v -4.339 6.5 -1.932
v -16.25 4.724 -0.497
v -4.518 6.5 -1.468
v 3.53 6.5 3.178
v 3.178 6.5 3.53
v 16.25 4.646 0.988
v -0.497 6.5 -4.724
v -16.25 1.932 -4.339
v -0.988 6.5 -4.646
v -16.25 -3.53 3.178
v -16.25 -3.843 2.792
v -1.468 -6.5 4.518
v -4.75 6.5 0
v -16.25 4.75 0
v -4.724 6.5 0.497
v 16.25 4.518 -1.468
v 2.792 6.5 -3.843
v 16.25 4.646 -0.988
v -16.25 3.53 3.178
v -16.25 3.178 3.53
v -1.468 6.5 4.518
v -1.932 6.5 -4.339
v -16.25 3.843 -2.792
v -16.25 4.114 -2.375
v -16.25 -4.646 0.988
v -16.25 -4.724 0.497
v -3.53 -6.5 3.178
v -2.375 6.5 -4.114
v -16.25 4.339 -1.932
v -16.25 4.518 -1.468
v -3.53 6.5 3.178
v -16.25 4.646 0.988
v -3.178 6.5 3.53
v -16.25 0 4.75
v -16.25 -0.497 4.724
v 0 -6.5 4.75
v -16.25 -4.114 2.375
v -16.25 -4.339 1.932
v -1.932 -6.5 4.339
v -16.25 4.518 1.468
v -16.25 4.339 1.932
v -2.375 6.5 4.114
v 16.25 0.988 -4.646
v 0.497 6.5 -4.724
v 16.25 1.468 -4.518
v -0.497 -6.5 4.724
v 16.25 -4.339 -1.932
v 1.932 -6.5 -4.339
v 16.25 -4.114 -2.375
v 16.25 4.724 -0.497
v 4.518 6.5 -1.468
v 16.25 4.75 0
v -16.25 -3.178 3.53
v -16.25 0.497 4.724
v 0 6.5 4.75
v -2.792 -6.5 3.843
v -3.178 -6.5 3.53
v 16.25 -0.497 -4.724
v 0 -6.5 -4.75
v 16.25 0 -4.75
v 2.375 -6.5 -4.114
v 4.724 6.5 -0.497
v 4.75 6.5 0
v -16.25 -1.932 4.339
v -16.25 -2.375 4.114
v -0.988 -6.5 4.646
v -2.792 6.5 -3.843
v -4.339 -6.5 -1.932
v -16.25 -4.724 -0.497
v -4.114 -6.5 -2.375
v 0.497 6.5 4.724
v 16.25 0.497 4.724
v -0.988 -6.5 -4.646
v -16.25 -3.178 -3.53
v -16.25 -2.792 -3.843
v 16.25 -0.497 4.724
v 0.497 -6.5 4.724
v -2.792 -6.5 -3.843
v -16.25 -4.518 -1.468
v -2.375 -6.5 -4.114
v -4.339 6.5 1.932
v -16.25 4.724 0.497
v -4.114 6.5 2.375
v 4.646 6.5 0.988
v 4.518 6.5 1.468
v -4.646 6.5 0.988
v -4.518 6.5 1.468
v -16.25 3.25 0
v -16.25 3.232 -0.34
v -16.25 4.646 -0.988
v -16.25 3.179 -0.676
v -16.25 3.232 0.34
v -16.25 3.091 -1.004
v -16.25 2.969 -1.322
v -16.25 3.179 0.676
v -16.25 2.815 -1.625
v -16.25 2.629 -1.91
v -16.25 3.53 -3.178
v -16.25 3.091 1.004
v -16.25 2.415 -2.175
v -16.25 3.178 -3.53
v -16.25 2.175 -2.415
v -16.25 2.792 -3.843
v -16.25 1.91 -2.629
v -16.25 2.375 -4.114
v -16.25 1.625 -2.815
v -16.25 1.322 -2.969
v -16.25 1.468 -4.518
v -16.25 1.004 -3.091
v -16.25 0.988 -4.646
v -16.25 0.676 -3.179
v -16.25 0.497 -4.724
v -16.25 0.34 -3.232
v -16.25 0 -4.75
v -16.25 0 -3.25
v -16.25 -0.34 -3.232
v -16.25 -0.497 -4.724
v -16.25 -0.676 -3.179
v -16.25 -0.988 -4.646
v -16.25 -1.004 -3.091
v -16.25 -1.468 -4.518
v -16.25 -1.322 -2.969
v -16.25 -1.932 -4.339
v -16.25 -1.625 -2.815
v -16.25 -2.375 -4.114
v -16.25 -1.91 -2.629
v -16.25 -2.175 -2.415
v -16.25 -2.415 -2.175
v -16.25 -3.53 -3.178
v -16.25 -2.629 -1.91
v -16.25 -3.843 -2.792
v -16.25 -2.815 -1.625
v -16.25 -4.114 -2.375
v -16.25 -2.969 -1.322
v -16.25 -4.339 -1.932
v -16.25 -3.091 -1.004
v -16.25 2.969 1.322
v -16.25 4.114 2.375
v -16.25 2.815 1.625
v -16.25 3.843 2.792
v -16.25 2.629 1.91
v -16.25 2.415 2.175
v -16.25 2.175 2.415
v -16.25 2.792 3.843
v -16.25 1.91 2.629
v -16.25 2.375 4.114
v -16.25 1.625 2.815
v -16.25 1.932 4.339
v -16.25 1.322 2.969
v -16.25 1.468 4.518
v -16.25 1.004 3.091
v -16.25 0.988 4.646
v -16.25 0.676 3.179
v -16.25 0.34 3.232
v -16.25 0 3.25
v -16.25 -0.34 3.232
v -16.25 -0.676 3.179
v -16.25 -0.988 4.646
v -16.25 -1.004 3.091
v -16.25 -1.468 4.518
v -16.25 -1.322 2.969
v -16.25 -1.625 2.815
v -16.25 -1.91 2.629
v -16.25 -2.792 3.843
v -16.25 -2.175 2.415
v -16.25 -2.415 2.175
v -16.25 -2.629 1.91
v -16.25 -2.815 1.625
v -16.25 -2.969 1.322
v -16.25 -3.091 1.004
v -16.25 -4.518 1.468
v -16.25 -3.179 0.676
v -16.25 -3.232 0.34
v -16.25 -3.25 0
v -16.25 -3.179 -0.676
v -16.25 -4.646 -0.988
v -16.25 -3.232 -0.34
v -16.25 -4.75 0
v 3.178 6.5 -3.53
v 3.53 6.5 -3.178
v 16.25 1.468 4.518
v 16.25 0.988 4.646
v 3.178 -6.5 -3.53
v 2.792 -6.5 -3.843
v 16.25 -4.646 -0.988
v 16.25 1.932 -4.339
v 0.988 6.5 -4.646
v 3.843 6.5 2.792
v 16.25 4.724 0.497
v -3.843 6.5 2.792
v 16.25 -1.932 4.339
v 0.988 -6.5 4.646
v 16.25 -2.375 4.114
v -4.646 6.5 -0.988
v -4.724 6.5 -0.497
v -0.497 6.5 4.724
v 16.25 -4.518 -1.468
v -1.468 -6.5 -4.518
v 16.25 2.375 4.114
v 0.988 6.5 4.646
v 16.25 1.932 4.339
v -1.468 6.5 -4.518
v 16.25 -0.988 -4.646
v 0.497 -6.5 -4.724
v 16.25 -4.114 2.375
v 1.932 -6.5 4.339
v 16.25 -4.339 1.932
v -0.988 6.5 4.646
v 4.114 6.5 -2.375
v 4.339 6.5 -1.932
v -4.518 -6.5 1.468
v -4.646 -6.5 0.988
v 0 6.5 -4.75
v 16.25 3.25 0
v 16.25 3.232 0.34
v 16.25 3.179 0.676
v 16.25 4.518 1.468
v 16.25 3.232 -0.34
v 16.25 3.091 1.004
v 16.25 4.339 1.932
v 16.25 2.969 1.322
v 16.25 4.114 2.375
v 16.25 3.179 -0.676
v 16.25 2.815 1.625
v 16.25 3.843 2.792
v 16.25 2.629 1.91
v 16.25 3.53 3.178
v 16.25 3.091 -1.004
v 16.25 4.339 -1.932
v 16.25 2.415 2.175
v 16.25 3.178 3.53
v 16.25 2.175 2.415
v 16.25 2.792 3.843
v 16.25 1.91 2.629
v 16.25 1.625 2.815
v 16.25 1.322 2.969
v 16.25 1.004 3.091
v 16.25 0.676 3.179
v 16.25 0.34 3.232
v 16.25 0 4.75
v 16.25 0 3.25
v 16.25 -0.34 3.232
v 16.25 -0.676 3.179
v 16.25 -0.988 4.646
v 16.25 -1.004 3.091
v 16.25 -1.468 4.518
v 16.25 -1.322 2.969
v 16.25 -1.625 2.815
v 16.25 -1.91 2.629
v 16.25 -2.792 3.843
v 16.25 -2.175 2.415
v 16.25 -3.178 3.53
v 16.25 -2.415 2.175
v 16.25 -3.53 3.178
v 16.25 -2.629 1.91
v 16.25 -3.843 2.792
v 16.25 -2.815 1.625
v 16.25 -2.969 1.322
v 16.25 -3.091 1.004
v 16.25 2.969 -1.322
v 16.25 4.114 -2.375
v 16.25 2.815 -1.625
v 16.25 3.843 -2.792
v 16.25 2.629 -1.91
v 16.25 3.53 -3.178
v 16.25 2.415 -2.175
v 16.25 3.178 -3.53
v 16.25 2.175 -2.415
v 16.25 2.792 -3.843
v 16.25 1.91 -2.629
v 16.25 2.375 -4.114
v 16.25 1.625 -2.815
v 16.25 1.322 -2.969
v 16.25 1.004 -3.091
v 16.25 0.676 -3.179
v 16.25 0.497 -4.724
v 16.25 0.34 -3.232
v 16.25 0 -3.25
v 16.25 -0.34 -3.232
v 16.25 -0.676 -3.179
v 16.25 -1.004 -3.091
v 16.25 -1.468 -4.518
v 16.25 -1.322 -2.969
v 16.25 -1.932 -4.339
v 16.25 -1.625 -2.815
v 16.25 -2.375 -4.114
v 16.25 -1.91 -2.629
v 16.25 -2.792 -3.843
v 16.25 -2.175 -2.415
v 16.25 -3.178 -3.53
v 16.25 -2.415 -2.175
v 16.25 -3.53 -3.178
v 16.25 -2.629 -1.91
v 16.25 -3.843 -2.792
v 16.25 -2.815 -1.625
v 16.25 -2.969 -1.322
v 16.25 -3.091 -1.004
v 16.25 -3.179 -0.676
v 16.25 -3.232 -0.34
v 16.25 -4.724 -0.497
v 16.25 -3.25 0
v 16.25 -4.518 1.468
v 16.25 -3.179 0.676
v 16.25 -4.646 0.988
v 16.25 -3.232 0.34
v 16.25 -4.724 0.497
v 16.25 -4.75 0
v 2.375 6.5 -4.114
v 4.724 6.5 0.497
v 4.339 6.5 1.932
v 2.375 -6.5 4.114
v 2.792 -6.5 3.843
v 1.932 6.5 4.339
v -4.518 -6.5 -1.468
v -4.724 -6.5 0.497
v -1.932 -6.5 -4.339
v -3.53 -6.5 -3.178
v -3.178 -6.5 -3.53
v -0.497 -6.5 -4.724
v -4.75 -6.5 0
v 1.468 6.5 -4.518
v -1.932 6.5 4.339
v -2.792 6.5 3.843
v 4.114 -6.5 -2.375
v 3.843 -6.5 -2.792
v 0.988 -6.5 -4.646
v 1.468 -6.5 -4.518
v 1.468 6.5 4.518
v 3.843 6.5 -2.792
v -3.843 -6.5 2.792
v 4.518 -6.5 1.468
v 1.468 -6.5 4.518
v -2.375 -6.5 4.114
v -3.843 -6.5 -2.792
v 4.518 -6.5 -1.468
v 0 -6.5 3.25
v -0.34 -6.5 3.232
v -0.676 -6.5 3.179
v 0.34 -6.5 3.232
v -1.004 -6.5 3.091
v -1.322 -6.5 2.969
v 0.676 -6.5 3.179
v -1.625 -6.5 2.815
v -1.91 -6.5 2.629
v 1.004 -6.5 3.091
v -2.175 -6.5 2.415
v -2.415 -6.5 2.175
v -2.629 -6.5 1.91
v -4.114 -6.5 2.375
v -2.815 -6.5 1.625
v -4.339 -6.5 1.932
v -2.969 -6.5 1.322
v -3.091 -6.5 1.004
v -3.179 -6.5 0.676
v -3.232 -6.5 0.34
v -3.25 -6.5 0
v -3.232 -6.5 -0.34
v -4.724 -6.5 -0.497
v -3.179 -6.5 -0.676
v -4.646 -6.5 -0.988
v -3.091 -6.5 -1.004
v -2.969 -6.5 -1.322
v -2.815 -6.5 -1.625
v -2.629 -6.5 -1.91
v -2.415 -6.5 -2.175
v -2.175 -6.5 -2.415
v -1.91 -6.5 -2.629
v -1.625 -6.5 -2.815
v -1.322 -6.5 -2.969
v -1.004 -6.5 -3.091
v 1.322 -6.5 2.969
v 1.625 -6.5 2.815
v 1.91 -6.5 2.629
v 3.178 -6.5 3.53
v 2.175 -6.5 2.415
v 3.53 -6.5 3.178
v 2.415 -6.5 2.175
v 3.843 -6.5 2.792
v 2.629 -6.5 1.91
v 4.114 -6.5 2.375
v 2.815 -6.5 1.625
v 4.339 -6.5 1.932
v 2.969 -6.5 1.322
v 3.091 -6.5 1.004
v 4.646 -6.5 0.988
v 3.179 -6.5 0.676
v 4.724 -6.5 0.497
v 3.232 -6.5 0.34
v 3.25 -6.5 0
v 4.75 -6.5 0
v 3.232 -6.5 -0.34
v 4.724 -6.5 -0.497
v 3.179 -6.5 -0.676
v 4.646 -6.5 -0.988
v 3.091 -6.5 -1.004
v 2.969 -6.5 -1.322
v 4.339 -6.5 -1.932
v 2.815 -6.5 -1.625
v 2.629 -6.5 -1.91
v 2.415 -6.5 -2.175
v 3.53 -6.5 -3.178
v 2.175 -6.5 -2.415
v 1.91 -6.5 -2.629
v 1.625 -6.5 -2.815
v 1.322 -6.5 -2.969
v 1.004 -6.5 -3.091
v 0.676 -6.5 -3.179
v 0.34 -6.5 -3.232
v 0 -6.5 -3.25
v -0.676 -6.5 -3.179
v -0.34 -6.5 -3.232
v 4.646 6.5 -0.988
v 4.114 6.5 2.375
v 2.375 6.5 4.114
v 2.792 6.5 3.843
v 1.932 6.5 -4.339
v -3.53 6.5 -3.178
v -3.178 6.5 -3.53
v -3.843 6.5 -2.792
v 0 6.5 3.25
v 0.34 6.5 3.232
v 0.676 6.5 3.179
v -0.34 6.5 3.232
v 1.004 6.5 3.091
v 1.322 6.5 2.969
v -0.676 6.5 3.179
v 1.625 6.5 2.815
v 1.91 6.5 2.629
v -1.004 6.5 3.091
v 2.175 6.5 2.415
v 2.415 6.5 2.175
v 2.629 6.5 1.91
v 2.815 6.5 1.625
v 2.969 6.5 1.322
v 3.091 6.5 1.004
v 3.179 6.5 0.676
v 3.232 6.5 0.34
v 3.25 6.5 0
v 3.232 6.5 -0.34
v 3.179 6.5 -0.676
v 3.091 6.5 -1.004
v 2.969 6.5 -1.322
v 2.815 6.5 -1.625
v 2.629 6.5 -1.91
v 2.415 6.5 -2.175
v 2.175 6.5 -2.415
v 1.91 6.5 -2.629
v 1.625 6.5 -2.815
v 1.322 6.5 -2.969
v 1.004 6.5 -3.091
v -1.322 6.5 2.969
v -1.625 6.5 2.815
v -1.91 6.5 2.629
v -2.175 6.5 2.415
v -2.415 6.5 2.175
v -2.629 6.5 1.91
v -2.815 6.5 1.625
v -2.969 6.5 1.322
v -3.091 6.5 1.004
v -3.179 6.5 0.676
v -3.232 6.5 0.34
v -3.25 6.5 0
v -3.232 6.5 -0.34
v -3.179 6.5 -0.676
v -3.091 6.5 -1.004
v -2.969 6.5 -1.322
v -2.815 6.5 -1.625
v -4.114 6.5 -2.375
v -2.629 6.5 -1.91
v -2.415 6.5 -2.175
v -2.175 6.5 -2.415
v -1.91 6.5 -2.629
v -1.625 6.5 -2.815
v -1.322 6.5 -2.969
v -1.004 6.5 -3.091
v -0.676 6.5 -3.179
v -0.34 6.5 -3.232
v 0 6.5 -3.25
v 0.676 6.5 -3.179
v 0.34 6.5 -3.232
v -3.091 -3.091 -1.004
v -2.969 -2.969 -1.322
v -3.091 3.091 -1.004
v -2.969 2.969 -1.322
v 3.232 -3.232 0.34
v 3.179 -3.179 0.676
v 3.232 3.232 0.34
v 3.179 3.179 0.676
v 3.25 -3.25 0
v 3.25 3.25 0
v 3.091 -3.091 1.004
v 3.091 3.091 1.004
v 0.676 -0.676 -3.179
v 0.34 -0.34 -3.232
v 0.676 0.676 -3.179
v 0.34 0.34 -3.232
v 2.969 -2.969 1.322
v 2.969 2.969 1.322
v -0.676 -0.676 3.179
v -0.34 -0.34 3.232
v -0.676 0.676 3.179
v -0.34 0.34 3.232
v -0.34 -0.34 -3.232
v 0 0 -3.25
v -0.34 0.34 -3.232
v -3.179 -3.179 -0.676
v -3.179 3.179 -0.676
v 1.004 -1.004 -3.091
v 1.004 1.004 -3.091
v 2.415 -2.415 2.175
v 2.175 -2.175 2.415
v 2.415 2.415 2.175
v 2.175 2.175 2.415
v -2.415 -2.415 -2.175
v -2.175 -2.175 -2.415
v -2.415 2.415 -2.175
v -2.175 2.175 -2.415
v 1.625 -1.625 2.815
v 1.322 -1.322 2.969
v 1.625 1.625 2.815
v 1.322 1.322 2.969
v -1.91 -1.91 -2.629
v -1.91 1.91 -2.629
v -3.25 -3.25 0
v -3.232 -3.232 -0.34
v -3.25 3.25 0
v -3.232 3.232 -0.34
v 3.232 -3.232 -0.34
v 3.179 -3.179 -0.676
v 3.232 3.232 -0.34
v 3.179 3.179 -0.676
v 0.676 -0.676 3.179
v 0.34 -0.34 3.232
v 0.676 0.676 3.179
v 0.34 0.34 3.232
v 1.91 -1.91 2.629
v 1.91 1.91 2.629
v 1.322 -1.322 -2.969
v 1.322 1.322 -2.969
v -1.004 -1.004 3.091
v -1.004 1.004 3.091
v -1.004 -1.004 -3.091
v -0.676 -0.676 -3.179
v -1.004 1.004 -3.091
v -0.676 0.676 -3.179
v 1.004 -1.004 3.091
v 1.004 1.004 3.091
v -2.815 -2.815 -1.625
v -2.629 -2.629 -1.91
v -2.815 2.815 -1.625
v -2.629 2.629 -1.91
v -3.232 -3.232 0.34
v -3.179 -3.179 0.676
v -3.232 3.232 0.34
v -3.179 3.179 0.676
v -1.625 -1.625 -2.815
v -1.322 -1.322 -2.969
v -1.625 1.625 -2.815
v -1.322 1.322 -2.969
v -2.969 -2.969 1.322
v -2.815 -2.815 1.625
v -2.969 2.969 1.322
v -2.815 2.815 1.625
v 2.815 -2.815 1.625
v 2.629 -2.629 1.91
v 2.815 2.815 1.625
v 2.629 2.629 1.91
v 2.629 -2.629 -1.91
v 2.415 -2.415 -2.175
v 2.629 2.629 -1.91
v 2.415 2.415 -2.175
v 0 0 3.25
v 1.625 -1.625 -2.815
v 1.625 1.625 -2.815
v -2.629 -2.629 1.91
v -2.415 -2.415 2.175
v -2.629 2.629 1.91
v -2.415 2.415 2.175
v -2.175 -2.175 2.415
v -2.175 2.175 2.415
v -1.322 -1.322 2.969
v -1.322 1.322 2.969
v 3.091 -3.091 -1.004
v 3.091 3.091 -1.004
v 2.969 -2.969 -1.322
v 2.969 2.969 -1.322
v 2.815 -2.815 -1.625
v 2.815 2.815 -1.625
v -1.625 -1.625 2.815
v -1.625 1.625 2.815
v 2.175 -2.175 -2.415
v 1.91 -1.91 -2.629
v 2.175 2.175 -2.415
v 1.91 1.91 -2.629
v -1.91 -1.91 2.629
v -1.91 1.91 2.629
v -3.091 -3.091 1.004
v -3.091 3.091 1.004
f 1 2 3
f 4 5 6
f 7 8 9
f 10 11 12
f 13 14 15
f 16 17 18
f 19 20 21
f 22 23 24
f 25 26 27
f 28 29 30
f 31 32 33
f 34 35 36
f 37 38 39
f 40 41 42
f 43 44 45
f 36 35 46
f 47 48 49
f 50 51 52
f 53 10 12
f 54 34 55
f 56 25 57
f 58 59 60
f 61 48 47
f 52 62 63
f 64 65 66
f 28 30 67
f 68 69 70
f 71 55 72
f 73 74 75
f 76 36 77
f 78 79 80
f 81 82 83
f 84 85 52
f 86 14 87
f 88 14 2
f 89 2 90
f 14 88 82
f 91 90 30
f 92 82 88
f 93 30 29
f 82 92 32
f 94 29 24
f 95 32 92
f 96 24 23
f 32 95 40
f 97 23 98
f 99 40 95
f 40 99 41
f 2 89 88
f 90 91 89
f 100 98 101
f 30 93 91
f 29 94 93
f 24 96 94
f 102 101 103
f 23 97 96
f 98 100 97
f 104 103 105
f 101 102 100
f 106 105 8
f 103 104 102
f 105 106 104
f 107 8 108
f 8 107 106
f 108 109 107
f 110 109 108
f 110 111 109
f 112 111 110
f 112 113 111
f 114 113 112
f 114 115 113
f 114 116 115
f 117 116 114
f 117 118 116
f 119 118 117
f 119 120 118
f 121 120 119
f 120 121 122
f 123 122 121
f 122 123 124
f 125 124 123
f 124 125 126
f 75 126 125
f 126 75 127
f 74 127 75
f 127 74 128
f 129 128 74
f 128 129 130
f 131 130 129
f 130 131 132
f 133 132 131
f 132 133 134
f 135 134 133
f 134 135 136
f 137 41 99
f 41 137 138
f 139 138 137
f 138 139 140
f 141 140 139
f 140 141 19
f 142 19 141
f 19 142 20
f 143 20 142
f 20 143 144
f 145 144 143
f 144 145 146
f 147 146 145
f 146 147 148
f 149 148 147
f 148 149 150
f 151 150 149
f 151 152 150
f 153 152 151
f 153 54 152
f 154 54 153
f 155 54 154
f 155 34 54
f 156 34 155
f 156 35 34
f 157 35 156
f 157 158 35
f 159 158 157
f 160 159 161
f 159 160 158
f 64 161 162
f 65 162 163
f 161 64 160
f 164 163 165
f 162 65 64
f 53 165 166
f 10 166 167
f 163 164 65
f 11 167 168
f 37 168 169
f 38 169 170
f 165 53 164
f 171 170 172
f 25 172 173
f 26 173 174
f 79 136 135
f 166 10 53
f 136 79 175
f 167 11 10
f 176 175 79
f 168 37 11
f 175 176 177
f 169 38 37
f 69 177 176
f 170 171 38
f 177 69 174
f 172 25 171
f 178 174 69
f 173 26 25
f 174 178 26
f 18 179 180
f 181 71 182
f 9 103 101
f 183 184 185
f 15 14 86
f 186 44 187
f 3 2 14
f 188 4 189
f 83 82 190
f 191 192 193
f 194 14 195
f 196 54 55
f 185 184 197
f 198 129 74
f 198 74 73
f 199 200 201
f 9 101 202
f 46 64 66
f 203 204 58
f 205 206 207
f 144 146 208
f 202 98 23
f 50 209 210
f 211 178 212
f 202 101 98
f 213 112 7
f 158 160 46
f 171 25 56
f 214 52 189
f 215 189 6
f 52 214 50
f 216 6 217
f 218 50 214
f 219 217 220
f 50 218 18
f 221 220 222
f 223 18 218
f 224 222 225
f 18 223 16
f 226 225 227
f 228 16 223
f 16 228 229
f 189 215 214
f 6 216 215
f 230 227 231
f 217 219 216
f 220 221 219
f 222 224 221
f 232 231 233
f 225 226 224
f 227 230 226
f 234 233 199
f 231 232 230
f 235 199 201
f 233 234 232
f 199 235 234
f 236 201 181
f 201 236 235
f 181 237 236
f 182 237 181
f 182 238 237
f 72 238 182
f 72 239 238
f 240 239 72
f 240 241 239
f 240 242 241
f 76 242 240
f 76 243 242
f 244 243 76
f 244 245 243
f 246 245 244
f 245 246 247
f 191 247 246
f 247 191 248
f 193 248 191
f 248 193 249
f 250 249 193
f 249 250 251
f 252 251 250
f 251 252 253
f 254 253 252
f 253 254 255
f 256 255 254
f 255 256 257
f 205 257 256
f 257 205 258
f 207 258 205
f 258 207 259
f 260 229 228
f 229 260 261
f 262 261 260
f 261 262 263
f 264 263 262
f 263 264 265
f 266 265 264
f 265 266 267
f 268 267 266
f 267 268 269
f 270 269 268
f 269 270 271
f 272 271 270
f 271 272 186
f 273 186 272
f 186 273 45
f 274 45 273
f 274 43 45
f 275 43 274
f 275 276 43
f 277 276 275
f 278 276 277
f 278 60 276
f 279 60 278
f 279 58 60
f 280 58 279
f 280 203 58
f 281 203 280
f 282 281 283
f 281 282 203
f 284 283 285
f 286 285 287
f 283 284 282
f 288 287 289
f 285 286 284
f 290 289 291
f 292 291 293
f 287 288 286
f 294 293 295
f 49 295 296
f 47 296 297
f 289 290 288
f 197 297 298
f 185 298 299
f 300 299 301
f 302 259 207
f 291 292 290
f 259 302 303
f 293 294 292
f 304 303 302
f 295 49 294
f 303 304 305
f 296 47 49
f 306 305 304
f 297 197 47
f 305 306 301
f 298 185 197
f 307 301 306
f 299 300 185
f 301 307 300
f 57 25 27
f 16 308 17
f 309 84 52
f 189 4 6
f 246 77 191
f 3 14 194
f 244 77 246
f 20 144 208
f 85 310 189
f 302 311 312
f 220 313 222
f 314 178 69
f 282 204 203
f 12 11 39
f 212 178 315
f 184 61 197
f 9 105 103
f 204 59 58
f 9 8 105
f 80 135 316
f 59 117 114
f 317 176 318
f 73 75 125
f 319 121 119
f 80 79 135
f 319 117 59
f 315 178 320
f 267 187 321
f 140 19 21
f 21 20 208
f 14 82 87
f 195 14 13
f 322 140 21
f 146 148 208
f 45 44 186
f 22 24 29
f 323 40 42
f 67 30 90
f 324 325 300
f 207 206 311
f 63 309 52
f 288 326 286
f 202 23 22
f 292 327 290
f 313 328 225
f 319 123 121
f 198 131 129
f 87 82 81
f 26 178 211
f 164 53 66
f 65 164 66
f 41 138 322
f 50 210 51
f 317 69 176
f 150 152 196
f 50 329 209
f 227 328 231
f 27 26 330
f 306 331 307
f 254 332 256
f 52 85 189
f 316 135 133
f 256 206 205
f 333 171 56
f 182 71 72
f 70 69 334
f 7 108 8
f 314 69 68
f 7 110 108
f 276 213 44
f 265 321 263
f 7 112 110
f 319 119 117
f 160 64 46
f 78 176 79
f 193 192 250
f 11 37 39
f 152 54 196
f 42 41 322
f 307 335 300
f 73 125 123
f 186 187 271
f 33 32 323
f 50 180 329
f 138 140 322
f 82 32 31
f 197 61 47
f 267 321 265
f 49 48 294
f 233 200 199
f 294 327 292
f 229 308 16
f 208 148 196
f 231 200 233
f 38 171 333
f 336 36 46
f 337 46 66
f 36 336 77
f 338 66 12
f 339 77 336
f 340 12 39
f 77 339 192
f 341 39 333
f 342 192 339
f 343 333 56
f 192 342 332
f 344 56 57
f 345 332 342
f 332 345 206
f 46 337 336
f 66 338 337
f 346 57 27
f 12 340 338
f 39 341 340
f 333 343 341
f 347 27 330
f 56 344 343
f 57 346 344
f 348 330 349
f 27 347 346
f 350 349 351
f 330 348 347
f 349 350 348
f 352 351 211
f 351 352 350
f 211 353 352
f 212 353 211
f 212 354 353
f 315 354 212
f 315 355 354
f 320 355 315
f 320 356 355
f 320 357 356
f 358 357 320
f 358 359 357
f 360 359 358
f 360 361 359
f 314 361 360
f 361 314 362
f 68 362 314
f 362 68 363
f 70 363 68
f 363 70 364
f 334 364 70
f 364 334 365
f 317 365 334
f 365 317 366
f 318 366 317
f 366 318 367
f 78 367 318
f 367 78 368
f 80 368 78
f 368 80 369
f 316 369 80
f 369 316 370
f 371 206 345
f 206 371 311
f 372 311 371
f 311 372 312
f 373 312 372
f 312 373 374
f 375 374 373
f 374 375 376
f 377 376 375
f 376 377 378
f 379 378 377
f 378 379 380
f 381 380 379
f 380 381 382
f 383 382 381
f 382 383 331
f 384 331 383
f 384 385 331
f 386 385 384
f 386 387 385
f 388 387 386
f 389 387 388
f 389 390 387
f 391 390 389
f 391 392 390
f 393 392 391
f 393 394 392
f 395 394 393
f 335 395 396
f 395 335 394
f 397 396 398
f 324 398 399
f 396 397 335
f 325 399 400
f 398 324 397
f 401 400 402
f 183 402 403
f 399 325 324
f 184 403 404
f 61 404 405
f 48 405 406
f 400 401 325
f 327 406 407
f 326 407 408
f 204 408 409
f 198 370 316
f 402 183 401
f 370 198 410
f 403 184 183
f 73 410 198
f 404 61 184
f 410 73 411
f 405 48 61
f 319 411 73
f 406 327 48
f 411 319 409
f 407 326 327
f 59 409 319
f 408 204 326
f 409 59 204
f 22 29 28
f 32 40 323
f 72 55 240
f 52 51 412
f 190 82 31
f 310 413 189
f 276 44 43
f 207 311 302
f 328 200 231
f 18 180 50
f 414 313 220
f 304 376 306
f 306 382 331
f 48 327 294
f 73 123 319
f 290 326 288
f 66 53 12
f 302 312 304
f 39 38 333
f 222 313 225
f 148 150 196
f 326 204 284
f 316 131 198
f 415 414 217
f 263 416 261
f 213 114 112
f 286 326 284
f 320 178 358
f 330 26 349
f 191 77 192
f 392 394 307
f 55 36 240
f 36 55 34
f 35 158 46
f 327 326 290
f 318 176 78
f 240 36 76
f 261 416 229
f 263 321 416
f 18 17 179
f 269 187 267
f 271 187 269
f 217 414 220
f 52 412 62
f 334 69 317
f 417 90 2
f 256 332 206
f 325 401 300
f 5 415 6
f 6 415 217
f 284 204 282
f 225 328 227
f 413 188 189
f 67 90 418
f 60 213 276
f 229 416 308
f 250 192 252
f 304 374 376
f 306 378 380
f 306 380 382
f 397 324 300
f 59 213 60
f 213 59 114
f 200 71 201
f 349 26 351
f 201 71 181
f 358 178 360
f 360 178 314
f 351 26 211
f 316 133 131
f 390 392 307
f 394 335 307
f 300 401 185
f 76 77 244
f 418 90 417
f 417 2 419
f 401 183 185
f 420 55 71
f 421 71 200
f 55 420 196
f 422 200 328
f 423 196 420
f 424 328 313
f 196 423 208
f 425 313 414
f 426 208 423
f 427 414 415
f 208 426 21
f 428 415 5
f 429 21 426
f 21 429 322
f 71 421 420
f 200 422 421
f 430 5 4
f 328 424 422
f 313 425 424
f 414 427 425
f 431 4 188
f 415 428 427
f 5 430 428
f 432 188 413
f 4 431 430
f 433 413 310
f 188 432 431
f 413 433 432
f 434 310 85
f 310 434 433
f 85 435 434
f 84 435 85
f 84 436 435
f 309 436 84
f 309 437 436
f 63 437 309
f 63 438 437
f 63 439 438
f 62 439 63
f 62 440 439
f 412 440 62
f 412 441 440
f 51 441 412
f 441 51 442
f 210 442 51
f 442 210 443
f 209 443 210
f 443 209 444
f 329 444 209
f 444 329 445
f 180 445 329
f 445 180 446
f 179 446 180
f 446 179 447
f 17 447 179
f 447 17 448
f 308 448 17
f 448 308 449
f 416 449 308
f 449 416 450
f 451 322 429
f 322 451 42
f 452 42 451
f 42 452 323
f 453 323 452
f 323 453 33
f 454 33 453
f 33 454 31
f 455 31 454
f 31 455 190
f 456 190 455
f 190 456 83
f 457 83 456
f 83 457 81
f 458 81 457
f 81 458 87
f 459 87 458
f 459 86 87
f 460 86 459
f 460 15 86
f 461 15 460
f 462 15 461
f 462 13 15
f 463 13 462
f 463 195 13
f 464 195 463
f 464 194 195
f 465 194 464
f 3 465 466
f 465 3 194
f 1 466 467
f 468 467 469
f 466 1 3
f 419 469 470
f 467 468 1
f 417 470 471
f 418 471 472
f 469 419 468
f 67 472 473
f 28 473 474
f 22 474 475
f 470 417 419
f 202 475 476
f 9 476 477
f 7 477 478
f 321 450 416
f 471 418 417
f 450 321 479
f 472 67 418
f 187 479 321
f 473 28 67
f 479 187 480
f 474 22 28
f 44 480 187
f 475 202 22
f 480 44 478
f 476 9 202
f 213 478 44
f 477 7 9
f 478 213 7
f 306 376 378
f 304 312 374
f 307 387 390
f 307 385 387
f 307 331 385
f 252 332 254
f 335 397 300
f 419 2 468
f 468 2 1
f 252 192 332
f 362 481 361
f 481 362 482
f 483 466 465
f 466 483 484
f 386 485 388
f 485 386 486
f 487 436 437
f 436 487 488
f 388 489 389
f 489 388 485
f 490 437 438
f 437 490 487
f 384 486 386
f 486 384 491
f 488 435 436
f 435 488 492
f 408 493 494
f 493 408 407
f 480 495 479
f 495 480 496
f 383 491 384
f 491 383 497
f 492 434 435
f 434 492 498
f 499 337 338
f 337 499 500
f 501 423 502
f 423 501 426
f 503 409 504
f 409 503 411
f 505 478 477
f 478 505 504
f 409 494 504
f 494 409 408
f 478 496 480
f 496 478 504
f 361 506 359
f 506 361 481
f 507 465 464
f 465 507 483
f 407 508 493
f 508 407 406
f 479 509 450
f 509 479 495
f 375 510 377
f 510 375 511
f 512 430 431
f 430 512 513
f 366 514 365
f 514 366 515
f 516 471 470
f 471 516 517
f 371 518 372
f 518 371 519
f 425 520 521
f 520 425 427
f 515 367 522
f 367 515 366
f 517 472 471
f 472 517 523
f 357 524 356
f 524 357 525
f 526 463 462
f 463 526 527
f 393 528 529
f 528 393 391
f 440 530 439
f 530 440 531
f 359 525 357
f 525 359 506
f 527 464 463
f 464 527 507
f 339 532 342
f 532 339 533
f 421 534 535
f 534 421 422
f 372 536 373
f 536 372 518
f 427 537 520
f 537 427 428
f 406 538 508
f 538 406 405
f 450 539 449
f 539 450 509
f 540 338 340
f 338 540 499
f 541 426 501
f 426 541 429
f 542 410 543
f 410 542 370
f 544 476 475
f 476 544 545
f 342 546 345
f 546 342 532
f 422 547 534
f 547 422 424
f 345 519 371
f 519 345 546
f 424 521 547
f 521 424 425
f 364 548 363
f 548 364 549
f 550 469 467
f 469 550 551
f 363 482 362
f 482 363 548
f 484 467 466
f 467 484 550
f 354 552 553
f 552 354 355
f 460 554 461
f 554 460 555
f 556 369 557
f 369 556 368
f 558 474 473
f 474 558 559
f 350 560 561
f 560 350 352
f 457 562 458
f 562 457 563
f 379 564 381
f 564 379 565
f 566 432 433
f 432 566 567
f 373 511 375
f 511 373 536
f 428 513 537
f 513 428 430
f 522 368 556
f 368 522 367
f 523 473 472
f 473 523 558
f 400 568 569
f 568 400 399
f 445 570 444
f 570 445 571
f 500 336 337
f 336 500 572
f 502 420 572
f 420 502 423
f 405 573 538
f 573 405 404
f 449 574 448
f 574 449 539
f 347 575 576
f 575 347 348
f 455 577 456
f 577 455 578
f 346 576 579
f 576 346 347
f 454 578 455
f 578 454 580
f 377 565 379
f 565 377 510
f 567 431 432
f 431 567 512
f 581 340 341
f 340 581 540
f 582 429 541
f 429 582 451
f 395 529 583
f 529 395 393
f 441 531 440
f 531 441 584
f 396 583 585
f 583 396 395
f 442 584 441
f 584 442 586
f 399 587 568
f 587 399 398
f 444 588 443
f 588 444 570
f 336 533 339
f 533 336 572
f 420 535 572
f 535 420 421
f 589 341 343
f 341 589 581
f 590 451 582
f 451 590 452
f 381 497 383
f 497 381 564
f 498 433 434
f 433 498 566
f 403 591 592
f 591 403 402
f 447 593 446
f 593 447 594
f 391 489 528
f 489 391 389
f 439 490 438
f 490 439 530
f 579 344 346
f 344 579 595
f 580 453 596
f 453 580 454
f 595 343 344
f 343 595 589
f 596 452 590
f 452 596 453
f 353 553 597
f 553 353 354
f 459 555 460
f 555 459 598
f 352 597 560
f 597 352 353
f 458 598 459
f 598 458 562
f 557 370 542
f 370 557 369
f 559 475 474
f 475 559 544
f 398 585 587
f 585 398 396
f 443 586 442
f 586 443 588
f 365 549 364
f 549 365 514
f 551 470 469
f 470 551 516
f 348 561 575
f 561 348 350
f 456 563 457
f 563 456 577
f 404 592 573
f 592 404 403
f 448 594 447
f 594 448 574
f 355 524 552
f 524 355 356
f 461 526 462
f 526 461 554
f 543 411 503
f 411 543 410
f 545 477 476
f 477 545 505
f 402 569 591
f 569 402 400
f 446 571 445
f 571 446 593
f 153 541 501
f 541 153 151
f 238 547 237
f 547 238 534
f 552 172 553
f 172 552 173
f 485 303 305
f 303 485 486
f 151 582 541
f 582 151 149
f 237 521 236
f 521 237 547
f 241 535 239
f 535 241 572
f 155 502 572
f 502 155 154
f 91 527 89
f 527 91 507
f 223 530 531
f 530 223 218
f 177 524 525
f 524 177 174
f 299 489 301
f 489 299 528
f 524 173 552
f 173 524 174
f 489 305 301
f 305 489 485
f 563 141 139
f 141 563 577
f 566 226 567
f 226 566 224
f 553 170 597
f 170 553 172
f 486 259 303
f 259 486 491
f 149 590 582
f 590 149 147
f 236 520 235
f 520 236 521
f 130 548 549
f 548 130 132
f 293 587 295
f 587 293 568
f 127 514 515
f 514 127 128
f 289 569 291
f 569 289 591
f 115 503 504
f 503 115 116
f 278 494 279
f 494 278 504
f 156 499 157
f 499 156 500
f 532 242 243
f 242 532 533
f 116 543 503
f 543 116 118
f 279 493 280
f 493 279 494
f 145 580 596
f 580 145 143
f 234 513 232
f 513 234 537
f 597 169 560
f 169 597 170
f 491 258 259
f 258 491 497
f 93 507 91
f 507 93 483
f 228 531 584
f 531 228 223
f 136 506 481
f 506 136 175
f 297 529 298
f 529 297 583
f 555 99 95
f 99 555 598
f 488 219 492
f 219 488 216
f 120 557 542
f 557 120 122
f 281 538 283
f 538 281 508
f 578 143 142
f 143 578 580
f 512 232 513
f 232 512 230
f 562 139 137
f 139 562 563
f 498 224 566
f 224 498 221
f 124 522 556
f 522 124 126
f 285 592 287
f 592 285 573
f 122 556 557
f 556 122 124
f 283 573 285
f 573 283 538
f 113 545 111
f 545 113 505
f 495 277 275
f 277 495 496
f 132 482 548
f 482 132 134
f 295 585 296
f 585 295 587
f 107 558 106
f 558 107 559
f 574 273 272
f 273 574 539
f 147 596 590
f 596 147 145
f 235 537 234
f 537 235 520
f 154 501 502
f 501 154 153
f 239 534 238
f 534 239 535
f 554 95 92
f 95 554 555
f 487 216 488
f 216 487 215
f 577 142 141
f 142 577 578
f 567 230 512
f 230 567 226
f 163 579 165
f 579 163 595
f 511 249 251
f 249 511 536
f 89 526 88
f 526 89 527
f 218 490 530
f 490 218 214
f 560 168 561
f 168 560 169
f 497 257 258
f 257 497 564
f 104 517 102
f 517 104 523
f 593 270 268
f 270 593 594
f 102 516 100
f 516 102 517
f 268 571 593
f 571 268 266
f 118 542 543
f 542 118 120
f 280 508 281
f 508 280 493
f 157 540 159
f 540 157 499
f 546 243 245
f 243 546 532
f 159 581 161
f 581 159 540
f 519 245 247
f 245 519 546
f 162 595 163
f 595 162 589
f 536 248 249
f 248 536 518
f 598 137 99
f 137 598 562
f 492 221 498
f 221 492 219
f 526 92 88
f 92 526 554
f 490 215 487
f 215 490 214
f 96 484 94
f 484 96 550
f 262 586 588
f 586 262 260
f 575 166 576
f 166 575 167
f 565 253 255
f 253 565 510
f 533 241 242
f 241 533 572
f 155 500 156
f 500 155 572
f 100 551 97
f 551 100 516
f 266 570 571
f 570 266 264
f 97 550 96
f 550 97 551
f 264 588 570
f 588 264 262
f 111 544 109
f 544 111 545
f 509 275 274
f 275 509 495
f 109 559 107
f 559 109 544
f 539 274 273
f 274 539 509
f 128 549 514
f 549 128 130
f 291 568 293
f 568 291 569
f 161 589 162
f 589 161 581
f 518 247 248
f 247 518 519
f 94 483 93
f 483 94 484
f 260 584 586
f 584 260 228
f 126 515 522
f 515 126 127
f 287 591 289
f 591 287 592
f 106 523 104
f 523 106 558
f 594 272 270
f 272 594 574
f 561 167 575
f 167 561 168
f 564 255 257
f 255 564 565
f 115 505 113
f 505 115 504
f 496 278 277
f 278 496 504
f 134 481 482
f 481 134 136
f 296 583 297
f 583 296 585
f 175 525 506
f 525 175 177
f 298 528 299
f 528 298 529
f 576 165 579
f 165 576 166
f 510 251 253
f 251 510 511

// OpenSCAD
// Center cross for a drone frame

//=======================================================================
// Config
//=======================================================================
//beam diameter
dia1=6.5;

//wall thickness main cross beam
wall=1.5;

//socket depth for both axis
socket1=dia1;
socket2=2*socket1+dia1/2;

//z-offset between the two axis
//z_offset=6.5;
z_offset=0;

//stiffening plate
plate_thickness=2;

//use hull?
use_hull=1;
//=======================================================================

$fn=60;  //number of facets
out1 = dia1+2*wall; //outside diameter

difference() {
  if(use_hull)
    hull() SolidCross();
  else
    union() SolidCross();

  translate([0,socket1*2,-z_offset/2]) rotate([90,0,0]) cylinder(h=socket1*4,d=dia1);
  translate([socket2*2,0,z_offset/2]) rotate([0,-90,0]) cylinder(h=socket2*4,d=dia1);
}

module SolidCross() {
  //rotate([0,0,45]) cube([(socket+dia1/2-1)*sqrt(2),(socket+dia1/2-1)*sqrt(2),plate_thickness],center=true);
  translate([0,socket1,-z_offset/2]) rotate([90,0,0]) cylinder(h=socket1*2,d=out1);
  translate([socket2,0,z_offset/2]) rotate([0,-90,0]) cylinder(h=socket2*2,d=out1);
}
